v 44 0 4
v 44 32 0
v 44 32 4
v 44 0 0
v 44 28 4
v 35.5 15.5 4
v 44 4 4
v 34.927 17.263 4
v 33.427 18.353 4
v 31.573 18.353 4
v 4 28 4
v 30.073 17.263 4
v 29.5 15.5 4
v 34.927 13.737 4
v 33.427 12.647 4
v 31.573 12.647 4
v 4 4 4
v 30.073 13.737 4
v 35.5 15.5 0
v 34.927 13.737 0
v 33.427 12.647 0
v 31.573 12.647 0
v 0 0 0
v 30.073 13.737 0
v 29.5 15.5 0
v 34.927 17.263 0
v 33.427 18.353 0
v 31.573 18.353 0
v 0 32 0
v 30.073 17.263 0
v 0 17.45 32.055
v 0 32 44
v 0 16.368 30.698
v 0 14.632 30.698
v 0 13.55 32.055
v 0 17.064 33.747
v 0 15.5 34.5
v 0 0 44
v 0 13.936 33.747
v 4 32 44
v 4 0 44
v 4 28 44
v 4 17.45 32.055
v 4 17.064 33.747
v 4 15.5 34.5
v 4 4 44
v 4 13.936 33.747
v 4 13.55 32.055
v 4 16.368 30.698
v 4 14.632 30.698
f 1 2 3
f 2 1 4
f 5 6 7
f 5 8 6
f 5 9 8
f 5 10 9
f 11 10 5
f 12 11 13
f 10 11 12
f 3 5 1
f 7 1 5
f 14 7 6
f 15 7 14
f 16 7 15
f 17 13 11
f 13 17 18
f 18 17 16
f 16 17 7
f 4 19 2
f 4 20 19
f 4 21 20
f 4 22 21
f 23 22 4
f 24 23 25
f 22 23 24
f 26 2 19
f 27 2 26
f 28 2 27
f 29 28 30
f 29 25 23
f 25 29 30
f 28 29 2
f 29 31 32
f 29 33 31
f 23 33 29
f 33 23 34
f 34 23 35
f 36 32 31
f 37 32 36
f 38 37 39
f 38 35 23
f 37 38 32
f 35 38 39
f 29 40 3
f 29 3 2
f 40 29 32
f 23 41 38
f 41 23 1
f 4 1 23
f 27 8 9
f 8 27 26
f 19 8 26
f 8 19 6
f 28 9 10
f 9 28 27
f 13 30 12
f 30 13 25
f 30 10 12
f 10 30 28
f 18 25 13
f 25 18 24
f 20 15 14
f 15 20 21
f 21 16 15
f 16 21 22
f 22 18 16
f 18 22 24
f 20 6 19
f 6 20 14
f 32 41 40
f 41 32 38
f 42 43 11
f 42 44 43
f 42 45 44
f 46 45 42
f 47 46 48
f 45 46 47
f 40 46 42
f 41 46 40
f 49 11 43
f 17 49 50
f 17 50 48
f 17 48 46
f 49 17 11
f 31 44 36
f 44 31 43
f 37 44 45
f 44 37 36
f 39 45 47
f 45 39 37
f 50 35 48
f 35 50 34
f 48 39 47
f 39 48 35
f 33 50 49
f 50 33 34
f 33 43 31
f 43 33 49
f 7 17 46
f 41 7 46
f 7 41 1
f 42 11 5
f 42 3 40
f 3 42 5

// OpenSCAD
// l-bracket.scad
//
// generates an l-bracket from the given parameters


// Copyright (c) 2015, Patrick Barrett
// All rights reserved.
//
// Redistribution and use in source and binary forms, with or without
// modification, are permitted provided that the following conditions are met:
//
// 1. Redistributions of source code must retain the above copyright notice,
// this list of conditions and the following disclaimer.
//
// 2. Redistributions in binary form must reproduce the above copyright notice,
// this list of conditions and the following disclaimer in the documentation
// and/or other materials provided with the distribution.
//
// THIS SOFTWARE IS PROVIDED BY THE COPYRIGHT HOLDERS AND CONTRIBUTORS "AS IS"
// AND ANY EXPRESS OR IMPLIED WARRANTIES, INCLUDING, BUT NOT LIMITED TO, THE
// IMPLIED WARRANTIES OF MERCHANTABILITY AND FITNESS FOR A PARTICULAR PURPOSE
// ARE DISCLAIMED. IN NO EVENT SHALL THE COPYRIGHT HOLDER OR CONTRIBUTORS BE
// LIABLE FOR ANY DIRECT, INDIRECT, INCIDENTAL, SPECIAL, EXEMPLARY, OR
// CONSEQUENTIAL DAMAGES (INCLUDING, BUT NOT LIMITED TO, PROCUREMENT OF
// SUBSTITUTE GOODS OR SERVICES; LOSS OF USE, DATA, OR PROFITS; OR BUSINESS
// INTERRUPTION) HOWEVER CAUSED AND ON ANY THEORY OF LIABILITY, WHETHER IN
// CONTRACT, STRICT LIABILITY, OR TORT (INCLUDING NEGLIGENCE OR OTHERWISE)
// ARISING IN ANY WAY OUT OF THE USE OF THIS SOFTWARE, EVEN IF ADVISED OF THE
// POSSIBILITY OF SUCH DAMAGE.

wall_thickness = 4;
internal_width = 24;
slot_width = 3;
side_length = 40;

// customizable variables end here

head_annulus = (internal_width/2) - (slot_width/2);

abit = 0.0001 * 1; //use for making overlap to get single manifold stl

module stadium3d(a, r, z, center = false){
	offset_x = center ? -(r + (a / 2)) : 0;
	offset_y = center ? -(r) : 0;
	offset_z = center ? -(z / 2) : 0;

	translate([offset_x, offset_y, offset_z])
	union() {
		translate([r, 0, 0])
			cube([a, 2*r, z]);
		translate([r, r, 0])
			cylinder(h = z, r = r, center = false);
		translate([r + a, r, 0])
			cylinder(h = z, r = r);
	}
}

union() {
	// horizontal wall
	difference() {
		cube([side_length + wall_thickness,
		      internal_width + 2*wall_thickness,
		      wall_thickness]);

		translate([32.5,
		           15.5,
		           -1])
cylinder(h=wall_thickness+head_annulus,r=slot_width,center=false);        
//			stadium3d(side_length - (2*head_annulus) - slot_width, slot_width / 2,  wall_thickness + 2);

	}

	// verticle wall
	translate([wall_thickness, 0, 0])
	rotate([0,-90,0])
	difference() {
		cube([side_length + wall_thickness,
		      internal_width + 2*wall_thickness,
		      wall_thickness]);
		translate([32.5,
		           15.5,
		           -1])
cylinder(h=wall_thickness+head_annulus,r=2,center=false);        

/*
			stadium3d(side_length - (2*head_annulus) - slot_width,
 			          slot_width / 2,
 			          wall_thickness + 2);
*/
	}

	// bracer 1
	translate([wall_thickness - abit,
	           wall_thickness,
	           wall_thickness - abit])
	rotate([90,0,0])
	linear_extrude(height = wall_thickness) {
		polygon([[0,0], [side_length,0], [0,side_length]]);
	}

	// bracer 2
	translate([wall_thickness - abit,
	           2*wall_thickness + internal_width,
	           wall_thickness - abit])
	rotate([90,0,0])
	linear_extrude(height = wall_thickness) {
		polygon([[0,0],[side_length,0], [0,side_length]]);
	}
}
